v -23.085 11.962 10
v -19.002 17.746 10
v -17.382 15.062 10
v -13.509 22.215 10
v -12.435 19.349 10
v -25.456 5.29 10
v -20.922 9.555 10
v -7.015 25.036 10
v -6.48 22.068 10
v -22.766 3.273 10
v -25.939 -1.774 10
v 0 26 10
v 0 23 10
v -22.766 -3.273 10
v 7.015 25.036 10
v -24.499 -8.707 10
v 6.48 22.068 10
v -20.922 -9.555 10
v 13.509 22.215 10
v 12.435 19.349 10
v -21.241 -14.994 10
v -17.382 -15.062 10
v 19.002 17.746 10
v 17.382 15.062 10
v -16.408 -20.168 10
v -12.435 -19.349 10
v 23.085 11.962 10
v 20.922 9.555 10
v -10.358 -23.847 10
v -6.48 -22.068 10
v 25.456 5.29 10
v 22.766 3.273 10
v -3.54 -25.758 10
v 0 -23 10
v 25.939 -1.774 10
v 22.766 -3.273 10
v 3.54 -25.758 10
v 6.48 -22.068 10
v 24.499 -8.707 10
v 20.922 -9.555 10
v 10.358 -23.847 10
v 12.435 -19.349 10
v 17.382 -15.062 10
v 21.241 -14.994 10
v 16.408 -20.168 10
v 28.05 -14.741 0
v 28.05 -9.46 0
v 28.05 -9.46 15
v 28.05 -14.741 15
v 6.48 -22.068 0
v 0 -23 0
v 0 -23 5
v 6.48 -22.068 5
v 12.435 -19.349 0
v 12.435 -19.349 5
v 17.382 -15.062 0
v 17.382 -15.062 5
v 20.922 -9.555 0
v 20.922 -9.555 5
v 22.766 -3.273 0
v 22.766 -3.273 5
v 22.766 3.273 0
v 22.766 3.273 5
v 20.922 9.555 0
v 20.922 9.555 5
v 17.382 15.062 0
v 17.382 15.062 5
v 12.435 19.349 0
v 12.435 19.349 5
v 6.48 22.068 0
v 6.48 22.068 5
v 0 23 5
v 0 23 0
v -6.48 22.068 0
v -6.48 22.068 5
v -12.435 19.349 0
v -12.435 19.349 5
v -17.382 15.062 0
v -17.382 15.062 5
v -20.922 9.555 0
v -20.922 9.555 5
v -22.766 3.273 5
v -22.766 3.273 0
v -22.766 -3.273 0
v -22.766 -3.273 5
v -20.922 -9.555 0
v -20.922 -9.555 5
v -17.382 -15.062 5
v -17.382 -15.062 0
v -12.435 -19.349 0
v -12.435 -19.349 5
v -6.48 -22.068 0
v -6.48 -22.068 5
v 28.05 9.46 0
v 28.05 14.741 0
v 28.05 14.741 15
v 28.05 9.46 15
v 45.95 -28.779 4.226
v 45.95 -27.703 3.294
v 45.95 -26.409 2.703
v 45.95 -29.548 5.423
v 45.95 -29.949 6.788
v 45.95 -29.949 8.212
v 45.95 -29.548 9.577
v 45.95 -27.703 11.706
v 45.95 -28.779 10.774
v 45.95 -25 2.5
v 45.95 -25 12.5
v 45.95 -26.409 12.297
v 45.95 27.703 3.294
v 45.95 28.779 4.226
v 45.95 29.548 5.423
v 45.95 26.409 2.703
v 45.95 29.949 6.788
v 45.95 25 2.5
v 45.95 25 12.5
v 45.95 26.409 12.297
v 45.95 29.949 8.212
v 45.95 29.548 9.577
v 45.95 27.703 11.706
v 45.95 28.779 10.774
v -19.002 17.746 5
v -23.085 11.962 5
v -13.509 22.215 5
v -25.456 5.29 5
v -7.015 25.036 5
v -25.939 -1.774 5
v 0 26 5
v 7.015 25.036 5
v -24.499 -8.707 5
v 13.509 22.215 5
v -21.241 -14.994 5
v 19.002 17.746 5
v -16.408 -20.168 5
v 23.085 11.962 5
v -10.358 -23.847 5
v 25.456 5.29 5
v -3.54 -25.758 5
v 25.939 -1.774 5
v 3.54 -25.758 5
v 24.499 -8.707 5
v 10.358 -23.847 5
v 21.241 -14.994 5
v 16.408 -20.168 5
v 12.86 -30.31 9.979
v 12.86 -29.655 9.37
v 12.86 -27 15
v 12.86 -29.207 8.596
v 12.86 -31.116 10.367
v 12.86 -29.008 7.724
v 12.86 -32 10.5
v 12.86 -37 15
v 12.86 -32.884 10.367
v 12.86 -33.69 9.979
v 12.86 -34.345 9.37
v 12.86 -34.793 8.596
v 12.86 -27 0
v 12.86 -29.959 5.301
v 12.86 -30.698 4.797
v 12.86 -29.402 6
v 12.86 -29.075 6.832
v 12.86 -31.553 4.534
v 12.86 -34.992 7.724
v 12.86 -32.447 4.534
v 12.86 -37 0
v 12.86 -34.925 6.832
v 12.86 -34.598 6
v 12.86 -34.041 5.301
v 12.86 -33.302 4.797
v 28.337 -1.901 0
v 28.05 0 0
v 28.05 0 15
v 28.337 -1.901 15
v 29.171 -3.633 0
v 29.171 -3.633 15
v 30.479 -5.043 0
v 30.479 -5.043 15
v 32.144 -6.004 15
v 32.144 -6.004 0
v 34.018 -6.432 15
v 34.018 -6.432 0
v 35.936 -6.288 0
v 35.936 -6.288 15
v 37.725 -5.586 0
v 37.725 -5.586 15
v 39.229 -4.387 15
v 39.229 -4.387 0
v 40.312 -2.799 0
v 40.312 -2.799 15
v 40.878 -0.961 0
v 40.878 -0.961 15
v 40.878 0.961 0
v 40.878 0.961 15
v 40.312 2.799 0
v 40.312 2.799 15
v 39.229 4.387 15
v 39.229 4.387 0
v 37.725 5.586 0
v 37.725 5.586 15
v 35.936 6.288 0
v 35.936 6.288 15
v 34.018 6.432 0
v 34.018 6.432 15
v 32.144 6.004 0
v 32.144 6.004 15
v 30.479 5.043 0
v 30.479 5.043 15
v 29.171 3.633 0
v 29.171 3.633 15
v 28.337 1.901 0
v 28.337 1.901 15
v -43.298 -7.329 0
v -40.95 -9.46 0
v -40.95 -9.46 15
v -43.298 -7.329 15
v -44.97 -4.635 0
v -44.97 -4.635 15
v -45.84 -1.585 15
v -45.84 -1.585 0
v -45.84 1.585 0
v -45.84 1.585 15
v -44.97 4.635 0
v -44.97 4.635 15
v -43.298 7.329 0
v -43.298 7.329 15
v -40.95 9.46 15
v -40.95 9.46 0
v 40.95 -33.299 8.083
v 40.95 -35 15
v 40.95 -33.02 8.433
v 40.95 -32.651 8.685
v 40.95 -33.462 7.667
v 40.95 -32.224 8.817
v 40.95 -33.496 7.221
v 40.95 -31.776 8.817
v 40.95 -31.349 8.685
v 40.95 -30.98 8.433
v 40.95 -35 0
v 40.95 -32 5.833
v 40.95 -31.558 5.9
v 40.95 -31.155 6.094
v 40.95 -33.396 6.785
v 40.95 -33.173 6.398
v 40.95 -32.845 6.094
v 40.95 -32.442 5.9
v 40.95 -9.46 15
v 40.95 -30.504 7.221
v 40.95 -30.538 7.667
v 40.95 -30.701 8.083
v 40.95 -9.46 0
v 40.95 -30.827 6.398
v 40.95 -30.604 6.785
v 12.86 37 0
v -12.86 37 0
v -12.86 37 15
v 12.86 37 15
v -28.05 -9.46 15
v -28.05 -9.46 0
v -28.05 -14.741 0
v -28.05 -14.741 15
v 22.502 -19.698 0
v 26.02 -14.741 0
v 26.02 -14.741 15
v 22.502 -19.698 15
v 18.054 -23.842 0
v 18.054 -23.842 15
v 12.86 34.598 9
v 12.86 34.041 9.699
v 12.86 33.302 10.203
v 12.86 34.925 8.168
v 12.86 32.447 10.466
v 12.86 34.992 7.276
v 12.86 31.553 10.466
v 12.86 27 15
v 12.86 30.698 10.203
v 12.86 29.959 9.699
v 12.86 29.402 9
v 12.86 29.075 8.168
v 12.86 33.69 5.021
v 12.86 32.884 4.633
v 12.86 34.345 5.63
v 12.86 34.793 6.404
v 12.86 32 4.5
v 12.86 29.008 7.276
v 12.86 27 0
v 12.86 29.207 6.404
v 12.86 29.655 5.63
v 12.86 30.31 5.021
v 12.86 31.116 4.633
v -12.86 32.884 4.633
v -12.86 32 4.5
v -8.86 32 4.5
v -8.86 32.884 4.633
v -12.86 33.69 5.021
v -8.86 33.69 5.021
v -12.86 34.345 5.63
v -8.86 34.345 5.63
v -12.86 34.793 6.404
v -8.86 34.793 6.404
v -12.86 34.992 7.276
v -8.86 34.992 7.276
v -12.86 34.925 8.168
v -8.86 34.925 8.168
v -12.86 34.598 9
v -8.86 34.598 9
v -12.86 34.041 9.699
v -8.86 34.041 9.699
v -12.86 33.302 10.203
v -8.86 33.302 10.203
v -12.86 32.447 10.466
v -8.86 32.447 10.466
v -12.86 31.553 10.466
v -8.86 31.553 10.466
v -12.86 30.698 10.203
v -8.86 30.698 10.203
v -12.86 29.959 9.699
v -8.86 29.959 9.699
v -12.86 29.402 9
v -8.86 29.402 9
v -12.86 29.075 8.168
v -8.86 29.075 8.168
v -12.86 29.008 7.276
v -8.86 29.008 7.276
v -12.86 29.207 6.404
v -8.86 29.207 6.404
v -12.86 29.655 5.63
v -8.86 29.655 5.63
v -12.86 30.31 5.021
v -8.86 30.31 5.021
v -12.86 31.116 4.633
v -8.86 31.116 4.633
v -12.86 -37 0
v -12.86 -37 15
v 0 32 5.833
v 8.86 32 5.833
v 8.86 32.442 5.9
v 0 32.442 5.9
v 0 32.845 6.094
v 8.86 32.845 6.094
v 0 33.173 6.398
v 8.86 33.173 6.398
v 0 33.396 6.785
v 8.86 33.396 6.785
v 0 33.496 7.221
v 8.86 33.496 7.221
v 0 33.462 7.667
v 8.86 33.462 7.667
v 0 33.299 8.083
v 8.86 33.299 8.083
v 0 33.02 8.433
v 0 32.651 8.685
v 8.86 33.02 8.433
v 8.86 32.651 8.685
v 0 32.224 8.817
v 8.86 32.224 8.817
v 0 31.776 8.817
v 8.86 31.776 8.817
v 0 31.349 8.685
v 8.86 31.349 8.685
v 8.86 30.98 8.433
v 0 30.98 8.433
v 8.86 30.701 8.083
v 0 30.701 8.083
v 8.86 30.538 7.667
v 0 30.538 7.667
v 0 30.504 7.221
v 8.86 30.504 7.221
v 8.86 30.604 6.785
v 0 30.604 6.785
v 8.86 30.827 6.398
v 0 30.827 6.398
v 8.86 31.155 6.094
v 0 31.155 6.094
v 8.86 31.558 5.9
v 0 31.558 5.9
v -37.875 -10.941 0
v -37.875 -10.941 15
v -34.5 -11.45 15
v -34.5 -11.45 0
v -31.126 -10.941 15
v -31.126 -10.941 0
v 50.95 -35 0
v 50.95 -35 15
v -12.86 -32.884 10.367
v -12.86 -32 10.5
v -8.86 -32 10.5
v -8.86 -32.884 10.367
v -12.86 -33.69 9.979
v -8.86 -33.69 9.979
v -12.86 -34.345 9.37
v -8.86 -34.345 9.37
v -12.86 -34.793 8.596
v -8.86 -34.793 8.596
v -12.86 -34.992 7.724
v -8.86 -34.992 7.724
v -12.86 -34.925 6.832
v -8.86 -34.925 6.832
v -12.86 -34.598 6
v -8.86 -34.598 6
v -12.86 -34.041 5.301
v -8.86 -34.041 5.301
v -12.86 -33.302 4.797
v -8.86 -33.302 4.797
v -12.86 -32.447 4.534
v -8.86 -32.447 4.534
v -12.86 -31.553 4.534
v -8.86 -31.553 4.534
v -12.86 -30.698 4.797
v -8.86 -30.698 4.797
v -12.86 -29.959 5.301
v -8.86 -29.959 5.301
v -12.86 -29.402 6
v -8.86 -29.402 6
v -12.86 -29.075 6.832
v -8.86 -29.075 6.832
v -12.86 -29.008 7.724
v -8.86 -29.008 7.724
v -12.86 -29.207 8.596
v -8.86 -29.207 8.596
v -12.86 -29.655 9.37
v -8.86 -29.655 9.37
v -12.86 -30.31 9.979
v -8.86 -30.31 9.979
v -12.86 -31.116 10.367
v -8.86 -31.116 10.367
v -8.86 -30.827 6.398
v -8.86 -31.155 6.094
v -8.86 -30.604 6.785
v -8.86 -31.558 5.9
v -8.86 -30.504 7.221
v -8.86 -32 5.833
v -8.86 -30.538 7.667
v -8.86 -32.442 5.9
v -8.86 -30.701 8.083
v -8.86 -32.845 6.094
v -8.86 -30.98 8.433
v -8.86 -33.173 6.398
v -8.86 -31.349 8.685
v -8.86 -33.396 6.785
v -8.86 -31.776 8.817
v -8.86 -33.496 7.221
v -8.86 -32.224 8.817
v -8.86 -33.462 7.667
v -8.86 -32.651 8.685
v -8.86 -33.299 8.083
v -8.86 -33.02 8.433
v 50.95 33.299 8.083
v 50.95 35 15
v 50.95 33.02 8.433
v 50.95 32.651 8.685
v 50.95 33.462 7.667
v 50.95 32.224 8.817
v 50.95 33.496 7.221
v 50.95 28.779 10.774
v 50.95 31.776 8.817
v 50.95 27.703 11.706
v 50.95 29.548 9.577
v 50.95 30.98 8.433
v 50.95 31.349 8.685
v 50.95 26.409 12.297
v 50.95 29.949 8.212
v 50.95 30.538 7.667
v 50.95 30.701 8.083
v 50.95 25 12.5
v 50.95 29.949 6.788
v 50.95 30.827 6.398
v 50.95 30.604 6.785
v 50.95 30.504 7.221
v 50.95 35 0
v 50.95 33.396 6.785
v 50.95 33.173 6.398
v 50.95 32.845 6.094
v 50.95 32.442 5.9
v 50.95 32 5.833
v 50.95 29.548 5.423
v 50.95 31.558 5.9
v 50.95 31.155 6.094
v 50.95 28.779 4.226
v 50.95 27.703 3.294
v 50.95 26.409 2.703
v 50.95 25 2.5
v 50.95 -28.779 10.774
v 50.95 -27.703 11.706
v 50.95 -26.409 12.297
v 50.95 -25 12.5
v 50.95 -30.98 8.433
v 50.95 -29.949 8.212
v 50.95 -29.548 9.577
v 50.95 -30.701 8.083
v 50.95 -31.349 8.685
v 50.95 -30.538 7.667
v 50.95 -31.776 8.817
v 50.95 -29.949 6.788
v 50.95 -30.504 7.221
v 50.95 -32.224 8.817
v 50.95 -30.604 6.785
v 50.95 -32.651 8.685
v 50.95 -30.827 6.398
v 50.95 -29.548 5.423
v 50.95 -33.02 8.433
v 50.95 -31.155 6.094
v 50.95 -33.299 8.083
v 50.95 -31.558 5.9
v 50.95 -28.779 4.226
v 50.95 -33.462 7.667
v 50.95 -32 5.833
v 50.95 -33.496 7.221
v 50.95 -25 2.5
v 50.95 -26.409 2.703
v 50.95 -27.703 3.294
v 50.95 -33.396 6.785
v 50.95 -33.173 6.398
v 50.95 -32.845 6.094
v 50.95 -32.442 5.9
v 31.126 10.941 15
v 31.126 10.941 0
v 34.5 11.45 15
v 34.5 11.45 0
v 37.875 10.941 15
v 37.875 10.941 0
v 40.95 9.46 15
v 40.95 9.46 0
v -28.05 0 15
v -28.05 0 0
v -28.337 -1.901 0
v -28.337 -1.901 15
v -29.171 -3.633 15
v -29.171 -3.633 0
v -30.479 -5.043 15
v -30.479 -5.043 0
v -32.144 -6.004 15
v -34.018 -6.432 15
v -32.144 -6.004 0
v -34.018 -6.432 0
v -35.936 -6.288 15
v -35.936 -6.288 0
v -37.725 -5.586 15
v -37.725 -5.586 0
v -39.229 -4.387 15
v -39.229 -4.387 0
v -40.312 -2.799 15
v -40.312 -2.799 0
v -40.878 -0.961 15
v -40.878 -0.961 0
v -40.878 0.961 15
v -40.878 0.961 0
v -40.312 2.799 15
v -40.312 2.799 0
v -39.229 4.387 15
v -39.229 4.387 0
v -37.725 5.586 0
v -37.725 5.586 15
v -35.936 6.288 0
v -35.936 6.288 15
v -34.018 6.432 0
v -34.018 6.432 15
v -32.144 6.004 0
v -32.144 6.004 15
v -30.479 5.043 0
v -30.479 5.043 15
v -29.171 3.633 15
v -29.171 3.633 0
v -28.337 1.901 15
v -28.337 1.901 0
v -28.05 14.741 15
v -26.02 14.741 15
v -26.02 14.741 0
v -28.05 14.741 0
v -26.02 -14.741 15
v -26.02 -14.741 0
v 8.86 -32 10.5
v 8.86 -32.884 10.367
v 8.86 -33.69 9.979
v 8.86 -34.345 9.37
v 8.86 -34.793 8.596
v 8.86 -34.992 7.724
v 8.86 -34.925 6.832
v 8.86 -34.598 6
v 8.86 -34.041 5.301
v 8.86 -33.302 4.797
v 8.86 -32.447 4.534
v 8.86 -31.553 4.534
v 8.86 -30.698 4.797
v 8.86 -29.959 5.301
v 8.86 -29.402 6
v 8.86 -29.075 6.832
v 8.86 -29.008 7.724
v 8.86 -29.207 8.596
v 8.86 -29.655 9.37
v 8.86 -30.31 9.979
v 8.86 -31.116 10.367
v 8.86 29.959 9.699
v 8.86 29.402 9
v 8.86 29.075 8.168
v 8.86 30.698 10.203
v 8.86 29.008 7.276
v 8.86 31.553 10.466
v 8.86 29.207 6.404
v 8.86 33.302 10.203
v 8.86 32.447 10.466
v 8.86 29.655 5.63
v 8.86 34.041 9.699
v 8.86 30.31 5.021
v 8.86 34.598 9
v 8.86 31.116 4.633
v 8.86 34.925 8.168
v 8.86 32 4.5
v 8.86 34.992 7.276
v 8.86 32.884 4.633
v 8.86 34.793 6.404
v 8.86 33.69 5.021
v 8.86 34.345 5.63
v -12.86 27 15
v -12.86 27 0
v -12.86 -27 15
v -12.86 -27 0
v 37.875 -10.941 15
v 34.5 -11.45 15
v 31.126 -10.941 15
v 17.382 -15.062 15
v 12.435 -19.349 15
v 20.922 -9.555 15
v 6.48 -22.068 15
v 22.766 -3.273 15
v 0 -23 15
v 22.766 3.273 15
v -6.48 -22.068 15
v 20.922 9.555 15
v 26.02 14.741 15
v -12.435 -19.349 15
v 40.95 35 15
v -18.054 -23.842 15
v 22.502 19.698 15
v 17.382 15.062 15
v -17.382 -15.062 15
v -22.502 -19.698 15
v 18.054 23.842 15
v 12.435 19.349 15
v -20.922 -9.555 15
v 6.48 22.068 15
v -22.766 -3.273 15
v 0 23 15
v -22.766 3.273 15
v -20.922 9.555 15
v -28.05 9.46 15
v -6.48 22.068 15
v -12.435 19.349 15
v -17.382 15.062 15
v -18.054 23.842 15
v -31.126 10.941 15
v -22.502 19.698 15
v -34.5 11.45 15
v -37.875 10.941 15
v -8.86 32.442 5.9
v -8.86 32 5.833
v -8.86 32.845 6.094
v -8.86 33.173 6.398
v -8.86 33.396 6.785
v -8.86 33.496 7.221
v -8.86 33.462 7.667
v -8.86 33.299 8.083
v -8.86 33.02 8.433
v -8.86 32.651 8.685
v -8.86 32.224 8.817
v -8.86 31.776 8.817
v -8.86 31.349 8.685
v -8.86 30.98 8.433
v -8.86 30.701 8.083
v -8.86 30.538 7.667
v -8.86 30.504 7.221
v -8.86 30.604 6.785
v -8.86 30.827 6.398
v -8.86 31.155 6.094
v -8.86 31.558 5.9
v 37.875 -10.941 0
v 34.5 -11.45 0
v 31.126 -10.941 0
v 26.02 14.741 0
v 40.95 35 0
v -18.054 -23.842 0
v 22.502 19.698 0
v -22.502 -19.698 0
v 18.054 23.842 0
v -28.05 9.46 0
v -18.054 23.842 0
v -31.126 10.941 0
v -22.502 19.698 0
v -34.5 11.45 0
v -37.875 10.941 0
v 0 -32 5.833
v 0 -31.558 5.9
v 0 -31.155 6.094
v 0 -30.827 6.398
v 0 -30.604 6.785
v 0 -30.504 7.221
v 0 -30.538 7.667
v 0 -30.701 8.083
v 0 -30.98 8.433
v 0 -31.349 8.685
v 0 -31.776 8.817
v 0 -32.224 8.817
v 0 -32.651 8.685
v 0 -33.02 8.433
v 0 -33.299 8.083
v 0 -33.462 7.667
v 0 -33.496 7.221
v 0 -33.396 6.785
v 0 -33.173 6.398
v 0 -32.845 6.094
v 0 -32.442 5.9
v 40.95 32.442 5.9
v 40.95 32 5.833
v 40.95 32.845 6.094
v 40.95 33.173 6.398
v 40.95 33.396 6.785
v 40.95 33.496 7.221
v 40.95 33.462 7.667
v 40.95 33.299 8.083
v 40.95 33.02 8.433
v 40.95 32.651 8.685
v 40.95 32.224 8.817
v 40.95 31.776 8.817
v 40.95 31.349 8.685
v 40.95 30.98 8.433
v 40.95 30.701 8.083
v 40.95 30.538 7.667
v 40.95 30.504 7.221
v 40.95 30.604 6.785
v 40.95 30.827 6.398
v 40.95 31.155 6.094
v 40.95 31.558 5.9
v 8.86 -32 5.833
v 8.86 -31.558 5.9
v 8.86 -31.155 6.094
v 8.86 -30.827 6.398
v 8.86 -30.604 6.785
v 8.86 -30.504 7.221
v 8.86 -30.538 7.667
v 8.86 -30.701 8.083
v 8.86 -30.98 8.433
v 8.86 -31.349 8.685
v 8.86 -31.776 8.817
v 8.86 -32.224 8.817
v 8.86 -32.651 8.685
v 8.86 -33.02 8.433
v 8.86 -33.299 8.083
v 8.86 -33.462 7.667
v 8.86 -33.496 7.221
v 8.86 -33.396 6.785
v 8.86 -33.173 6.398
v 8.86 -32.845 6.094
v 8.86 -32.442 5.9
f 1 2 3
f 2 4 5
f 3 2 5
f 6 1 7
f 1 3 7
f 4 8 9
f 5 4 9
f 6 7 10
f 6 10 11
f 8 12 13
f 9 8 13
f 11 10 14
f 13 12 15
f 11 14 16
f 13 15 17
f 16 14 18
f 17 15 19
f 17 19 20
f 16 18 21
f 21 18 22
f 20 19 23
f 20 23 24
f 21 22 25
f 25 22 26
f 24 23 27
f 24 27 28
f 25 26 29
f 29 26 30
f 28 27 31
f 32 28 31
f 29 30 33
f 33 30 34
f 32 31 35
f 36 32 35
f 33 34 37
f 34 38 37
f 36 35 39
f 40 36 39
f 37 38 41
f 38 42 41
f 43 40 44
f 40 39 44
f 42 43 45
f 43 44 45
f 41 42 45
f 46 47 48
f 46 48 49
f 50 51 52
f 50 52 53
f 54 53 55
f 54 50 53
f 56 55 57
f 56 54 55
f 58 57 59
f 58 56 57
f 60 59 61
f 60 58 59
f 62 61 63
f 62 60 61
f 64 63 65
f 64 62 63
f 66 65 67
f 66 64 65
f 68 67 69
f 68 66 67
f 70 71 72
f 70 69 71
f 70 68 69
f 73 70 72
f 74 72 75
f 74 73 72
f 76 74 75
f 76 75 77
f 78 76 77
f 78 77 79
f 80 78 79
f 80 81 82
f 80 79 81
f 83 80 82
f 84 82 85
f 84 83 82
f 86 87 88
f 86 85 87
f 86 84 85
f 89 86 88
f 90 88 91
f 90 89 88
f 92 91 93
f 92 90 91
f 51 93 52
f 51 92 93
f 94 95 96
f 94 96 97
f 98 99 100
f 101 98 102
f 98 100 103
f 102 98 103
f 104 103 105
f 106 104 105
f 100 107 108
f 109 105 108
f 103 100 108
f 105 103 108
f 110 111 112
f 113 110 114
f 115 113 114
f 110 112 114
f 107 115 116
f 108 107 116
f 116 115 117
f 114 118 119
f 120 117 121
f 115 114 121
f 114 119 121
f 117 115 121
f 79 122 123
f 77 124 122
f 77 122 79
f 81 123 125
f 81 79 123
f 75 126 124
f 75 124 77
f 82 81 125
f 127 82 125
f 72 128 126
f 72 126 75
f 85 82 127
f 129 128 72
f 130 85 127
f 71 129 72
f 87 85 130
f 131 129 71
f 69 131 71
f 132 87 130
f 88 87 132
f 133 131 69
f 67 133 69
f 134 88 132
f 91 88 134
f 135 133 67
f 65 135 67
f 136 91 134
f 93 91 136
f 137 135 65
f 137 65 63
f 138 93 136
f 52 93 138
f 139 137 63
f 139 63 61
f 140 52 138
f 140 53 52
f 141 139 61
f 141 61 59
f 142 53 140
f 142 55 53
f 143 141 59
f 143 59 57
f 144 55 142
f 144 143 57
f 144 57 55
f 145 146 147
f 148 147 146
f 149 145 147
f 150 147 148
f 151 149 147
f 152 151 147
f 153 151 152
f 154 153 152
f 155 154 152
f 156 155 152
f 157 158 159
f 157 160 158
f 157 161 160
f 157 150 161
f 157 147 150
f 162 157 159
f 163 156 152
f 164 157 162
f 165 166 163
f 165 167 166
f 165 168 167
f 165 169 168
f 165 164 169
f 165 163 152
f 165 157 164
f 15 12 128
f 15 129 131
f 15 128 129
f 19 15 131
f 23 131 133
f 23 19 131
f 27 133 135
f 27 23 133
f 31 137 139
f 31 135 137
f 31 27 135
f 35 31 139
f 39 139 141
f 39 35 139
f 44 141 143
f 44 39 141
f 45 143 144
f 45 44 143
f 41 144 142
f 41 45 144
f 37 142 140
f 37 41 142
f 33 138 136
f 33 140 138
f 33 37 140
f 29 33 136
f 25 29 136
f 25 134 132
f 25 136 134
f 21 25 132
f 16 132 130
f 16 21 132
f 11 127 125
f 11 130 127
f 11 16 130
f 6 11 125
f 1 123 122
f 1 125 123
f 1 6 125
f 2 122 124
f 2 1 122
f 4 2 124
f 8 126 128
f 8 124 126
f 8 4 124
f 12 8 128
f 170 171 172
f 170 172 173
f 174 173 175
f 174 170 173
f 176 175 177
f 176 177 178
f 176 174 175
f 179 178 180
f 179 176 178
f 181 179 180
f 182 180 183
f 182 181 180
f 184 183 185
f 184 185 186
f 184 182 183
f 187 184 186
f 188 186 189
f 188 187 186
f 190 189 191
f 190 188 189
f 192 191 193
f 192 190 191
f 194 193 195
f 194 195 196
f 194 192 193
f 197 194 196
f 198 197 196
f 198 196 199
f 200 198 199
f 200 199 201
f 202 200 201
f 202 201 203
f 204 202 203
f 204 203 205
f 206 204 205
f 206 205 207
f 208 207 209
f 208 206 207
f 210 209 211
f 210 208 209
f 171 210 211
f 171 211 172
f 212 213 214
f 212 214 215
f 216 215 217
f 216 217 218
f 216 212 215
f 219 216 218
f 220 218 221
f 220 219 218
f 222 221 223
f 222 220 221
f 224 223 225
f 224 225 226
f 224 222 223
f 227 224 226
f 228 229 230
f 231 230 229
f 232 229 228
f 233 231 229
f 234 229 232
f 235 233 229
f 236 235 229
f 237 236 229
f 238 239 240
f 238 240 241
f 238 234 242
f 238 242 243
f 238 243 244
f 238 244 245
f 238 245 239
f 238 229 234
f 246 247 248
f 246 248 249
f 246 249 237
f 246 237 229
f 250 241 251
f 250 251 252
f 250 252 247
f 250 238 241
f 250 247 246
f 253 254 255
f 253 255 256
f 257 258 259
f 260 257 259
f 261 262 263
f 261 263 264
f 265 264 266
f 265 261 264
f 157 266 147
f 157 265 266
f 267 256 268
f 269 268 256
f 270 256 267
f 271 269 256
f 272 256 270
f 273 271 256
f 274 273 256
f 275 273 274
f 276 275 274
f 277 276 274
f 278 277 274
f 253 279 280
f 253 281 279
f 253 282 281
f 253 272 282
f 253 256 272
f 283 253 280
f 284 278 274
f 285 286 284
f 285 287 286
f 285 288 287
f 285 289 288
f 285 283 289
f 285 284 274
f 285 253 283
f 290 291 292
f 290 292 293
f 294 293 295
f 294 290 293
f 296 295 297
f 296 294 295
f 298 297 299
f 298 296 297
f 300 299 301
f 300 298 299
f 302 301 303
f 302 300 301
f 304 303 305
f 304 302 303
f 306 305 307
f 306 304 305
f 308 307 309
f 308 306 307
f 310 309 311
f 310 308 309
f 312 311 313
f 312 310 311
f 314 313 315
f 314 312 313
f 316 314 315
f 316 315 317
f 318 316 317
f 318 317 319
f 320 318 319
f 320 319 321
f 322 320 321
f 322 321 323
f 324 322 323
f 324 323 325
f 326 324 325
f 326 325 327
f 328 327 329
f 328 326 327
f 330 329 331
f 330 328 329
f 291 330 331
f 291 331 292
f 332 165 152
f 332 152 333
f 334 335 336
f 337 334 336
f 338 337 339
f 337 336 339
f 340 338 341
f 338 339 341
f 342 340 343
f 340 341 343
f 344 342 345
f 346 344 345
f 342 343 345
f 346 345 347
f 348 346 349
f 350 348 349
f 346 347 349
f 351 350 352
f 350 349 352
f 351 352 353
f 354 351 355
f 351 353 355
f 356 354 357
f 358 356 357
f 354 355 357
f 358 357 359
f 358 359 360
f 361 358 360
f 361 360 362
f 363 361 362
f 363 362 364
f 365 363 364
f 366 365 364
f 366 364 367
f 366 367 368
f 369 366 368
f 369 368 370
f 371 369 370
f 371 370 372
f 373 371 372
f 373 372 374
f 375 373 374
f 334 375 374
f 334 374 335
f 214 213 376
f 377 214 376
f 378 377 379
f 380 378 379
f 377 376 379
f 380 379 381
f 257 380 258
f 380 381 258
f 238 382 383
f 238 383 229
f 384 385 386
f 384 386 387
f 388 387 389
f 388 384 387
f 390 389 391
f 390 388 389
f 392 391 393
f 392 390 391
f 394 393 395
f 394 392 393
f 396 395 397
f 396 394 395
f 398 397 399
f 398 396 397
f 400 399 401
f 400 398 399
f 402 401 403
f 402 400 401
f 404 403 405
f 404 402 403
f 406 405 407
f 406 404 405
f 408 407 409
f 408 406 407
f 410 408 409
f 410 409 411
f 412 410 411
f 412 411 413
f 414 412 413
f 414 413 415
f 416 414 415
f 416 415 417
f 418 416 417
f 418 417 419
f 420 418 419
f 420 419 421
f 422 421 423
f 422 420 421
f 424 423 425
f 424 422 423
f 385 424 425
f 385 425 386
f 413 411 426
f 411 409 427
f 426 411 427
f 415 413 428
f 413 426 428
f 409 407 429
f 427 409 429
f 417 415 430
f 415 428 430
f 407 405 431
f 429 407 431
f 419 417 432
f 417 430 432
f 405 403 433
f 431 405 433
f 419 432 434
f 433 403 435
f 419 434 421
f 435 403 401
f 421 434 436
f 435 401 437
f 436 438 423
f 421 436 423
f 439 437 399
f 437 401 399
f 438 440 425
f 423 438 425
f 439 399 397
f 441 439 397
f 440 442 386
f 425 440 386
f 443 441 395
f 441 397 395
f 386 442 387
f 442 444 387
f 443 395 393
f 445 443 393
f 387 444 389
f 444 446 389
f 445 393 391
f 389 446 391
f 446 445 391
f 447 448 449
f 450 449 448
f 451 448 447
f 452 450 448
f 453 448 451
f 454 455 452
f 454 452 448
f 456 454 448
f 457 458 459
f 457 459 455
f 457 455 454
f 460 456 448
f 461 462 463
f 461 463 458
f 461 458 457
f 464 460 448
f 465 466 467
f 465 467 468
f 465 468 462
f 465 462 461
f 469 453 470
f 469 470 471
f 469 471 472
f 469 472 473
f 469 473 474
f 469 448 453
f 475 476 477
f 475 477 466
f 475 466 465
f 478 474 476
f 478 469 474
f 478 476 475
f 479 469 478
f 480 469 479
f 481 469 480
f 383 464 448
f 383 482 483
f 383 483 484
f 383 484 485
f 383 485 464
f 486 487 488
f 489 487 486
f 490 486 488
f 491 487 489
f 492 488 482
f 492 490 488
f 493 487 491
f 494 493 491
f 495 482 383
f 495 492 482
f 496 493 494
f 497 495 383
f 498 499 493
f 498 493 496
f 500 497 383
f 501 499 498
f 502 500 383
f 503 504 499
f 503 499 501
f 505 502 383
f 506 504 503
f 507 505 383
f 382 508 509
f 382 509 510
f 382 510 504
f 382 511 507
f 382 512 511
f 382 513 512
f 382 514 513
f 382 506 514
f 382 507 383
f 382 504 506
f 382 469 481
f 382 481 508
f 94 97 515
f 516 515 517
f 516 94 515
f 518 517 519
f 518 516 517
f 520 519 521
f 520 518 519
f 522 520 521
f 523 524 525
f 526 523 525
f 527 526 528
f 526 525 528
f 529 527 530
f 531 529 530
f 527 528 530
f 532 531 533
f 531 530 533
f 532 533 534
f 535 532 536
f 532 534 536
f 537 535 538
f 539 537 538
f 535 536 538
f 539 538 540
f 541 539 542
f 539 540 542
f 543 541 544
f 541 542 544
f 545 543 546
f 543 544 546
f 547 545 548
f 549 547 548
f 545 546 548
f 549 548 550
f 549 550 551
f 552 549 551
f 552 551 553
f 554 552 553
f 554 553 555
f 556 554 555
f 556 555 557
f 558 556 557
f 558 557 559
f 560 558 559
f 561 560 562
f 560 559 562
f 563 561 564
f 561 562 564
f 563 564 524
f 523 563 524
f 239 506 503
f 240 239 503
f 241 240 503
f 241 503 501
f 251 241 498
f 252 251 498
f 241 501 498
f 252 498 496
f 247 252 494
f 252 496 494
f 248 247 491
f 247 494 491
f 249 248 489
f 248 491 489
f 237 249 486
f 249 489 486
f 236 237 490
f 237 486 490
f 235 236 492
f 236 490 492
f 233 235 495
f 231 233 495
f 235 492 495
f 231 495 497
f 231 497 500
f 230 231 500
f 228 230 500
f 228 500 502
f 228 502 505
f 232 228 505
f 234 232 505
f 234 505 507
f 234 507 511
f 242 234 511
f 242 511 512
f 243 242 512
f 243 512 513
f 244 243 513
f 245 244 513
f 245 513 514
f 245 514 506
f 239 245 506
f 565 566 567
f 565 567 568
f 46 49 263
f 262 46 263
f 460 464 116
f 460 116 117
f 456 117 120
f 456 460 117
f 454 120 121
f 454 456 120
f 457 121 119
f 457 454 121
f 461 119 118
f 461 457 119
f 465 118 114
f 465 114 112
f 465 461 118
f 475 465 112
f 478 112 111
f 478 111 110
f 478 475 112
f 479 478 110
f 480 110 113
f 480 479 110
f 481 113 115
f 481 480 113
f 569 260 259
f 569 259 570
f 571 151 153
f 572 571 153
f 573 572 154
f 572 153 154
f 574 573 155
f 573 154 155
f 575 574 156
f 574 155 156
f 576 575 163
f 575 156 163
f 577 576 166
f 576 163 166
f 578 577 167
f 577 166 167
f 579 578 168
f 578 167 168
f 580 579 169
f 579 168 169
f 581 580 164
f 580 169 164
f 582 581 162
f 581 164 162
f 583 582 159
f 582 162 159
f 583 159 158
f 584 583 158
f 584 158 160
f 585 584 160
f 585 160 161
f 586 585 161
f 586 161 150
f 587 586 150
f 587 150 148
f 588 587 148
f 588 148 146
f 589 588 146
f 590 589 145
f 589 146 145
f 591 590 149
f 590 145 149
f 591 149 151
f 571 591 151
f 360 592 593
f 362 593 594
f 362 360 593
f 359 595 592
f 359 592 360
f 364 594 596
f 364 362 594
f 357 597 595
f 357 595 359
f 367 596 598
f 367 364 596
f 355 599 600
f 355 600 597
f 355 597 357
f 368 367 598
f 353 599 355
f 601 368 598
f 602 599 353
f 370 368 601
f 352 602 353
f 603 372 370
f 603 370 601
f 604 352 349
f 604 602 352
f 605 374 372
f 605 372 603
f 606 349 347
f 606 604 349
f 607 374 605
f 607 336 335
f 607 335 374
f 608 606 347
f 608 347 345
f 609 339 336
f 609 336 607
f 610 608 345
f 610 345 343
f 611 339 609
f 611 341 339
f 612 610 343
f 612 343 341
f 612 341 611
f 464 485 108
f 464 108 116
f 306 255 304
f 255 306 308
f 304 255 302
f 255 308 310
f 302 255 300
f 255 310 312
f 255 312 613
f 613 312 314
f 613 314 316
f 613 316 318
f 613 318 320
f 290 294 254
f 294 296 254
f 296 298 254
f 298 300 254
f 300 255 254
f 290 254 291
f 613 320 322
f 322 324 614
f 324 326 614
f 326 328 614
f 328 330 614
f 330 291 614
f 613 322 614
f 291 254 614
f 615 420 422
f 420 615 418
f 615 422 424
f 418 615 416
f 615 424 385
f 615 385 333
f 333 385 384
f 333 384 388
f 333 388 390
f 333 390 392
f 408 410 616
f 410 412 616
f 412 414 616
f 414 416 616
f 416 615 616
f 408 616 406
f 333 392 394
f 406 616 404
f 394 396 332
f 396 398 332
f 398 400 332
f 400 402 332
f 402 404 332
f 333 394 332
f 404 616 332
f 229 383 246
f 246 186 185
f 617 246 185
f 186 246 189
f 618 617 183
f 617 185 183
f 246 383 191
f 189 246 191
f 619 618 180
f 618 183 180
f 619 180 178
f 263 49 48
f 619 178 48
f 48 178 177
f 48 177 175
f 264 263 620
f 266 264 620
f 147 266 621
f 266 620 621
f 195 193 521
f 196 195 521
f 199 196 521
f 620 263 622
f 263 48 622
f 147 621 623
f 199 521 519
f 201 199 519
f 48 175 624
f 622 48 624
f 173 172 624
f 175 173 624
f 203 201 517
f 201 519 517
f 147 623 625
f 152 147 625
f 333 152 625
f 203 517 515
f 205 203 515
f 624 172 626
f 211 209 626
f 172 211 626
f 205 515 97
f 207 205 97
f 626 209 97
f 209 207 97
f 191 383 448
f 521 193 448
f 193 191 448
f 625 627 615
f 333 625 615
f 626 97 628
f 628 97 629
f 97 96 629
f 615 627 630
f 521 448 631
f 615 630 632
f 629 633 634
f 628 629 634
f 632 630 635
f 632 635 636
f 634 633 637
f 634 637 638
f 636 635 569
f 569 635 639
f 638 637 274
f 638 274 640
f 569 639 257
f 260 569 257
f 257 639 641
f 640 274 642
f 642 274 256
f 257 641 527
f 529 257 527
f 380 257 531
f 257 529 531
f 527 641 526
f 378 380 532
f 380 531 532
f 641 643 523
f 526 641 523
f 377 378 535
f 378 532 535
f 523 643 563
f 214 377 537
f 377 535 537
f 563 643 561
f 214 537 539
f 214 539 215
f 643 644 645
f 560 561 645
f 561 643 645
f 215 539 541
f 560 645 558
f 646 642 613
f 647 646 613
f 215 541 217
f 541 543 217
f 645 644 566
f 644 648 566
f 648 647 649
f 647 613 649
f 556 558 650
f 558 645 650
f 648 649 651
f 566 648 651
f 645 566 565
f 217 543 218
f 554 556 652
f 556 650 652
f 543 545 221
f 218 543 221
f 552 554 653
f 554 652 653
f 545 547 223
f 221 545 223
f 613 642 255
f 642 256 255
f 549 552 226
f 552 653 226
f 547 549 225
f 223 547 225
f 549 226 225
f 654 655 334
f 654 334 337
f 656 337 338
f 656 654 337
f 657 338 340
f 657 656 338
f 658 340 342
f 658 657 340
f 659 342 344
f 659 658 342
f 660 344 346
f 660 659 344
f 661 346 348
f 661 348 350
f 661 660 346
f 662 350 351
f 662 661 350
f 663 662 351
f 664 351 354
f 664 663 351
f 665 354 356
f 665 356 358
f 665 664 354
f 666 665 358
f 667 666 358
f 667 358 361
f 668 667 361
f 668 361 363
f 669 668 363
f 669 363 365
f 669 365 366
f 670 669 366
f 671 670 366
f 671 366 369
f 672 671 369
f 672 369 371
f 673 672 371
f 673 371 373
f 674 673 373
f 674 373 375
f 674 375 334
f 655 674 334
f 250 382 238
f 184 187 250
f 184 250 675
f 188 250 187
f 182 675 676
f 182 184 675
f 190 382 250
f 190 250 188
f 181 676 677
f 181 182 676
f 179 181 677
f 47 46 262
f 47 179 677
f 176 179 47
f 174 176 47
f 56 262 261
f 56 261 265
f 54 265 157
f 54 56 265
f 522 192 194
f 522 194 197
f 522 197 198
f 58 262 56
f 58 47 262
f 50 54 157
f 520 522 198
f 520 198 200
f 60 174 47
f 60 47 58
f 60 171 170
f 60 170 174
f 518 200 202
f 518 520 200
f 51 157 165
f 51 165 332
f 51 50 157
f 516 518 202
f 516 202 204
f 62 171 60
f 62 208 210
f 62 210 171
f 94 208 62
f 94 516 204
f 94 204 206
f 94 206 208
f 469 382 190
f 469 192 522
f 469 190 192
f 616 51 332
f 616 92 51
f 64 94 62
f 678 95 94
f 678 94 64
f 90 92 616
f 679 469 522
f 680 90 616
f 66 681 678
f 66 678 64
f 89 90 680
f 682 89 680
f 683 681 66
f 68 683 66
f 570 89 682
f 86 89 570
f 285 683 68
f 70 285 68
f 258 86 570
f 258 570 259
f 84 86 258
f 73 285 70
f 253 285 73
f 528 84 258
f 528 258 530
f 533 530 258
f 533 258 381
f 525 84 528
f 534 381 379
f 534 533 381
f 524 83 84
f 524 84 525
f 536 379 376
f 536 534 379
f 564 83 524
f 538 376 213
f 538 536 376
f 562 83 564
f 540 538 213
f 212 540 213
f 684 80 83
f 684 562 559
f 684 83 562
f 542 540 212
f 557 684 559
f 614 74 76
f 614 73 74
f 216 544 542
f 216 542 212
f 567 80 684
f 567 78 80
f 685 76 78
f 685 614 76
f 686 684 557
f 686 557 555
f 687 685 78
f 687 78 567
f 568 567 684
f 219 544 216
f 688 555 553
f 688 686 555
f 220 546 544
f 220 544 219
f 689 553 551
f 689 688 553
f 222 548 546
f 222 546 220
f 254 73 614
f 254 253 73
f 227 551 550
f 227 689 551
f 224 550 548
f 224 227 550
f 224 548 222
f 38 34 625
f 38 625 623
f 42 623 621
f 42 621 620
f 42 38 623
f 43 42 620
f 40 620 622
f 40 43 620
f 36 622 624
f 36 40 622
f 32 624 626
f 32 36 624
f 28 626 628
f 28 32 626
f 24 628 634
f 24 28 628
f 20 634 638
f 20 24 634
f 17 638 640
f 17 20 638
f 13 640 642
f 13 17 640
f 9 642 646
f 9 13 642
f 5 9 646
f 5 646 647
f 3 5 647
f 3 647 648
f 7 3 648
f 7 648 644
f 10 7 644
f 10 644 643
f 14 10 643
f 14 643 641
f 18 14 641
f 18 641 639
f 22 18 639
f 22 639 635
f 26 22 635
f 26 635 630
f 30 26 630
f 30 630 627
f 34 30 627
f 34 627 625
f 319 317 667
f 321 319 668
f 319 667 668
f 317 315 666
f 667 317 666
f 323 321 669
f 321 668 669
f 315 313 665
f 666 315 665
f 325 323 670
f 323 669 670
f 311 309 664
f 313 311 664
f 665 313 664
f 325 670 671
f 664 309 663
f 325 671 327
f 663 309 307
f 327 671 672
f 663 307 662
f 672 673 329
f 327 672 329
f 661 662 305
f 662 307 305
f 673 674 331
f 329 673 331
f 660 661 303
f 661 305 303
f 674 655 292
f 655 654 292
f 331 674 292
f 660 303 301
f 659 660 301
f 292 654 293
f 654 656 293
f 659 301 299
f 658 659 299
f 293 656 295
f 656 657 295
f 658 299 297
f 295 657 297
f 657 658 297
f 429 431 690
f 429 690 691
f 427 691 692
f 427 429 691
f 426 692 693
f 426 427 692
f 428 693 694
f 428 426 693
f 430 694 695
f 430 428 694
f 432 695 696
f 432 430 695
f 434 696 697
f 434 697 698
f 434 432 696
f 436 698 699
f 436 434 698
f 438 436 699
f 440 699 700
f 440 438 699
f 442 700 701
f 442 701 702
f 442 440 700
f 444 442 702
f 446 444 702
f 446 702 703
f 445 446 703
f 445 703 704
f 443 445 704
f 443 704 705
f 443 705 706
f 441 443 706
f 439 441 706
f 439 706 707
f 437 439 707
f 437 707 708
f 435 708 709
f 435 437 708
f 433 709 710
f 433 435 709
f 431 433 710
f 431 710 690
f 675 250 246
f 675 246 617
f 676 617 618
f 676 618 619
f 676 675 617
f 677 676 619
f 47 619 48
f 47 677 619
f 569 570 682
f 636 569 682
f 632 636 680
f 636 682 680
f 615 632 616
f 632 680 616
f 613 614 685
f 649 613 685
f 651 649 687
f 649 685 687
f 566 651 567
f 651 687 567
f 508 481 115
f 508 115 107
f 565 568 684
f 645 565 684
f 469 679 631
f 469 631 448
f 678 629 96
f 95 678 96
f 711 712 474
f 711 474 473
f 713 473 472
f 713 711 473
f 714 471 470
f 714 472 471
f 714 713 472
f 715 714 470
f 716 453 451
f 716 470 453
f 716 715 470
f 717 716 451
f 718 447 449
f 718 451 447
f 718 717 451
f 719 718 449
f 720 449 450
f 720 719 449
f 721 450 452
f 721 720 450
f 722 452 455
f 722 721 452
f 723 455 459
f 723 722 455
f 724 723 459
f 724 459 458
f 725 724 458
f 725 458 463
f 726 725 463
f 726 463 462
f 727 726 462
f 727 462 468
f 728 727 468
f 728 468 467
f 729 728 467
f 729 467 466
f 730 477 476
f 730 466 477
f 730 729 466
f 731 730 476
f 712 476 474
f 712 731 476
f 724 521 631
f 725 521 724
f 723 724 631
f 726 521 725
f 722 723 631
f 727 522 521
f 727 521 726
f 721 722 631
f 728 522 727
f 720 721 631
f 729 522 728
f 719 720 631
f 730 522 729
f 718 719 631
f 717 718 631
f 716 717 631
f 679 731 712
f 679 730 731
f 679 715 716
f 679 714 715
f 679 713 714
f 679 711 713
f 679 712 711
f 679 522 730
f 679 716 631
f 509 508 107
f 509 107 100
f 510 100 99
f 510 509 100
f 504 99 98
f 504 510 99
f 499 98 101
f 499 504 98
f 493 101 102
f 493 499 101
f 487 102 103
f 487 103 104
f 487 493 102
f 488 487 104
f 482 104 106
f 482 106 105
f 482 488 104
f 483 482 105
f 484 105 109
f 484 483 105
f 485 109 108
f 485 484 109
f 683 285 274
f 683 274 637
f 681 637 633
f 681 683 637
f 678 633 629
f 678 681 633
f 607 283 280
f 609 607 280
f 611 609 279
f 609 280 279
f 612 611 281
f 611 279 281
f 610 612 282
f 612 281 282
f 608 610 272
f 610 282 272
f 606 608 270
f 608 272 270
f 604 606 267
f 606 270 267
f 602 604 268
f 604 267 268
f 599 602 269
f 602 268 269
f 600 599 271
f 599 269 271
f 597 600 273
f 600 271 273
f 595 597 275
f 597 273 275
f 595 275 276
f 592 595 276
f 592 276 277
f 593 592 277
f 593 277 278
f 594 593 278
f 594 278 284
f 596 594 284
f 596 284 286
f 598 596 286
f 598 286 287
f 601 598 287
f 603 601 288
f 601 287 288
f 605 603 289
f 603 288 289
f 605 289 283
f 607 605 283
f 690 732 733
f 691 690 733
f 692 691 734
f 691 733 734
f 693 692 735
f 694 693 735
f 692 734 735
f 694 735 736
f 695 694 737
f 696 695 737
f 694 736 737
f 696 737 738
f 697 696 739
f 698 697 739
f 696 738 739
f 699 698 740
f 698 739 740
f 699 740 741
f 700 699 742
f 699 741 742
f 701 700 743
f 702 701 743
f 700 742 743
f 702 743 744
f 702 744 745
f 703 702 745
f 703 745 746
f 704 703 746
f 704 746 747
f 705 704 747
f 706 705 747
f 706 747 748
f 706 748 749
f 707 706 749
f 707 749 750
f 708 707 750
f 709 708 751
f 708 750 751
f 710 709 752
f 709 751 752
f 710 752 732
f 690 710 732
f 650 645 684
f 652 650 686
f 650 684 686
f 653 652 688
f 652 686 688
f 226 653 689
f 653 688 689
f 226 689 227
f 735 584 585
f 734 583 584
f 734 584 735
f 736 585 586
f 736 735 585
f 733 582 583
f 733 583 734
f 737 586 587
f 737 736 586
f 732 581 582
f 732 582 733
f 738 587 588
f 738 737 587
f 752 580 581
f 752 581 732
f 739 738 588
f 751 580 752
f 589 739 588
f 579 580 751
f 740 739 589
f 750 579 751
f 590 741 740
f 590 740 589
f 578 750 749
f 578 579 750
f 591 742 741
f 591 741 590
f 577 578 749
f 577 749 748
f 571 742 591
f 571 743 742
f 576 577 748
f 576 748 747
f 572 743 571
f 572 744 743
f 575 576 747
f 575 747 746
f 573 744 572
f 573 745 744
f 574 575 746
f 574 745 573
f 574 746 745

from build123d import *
from build123d.topology import SkipClean

# Parameters (mm, degrees)
SKETCH1_R           = 6.45
BOSS_EXTRUDE1_DEPTH = 15
SKETCH2_W           = 5
SKETCH2_H           = 3
CUT_EXTRUDE3_DEPTH  = 5
SKETCH4_R           = 1.5
CUT_EXTRUDE4_DEPTH  = 56.180796325
SKETCH5_R           = 3
CUT_EXTRUDE5_DEPTH  = 4
CUT_EXTRUDE6_START  = -80
CUT_EXTRUDE6_DEPTH  = 80


with BuildPart() as part:
    # Sketch1 → Boss-Extrude1 (new body)
    with BuildSketch(Plane.XY):
        with BuildLine():
            Line((0, 23), (0, 37))
            Line((0, 37), (12.859510911, 37))
            Line((12.859510911, 37), (12.859510911, 27))
            ThreePointArc((12.859510911, 27), (20.383390121, 21.88342816), (26.020458433, 14.741192754))
            Line((26.020458433, 14.741192754), (28.050458433, 14.741192754))
            Line((28.050458433, 14.741192754), (28.050458433, 9.460443964))
            ThreePointArc((28.050458433, 9.460443964), (34.500458433, 11.45), (40.950458433, 9.460443964))
            Line((40.950458433, 9.460443964), (40.950458433, 35))
            Line((40.950458433, 35), (50.950458433, 35))
            Line((50.950458433, 35), (50.950458433, -35))
            Line((50.950458433, -35), (40.950458433, -35))
            Line((40.950458433, -35), (40.950458433, -9.460443964))
            ThreePointArc((40.950458433, -9.460443964), (34.500458433, -11.45), (28.050458433, -9.460443964))
            Line((28.050458433, -9.460443964), (28.050458433, -14.741192754))
            Line((28.050458433, -14.741192754), (26.020458433, -14.741192754))
            ThreePointArc((26.020458433, -14.741192754), (20.383390121, -21.88342816), (12.859510911, -27))
            Line((12.859510911, -27), (12.859510911, -37))
            Line((12.859510911, -37), (0, -37))
            Line((0, -37), (0, -23))
            ThreePointArc((0, -23), (23, 0), (0, 23))
        make_face()
        with Locations(Location((34.500458433, 0, 0), (0, 0, 180))):
            Circle(SKETCH1_R, mode=Mode.SUBTRACT)
    boss_extrude1 = extrude(amount=BOSS_EXTRUDE1_DEPTH)

    # Sketch2 → Cut-Revolve1 (revolve, cut)
    with BuildSketch(Plane.ZY):
        with Locations((7.5, 24.5)):
            Rectangle(SKETCH2_W, SKETCH2_H)
    cut_revolve1 = revolve(axis=Axis((0, 0, 15), (0, 0, -1)), mode=Mode.SUBTRACT)

    # Sketch3 → Cut-Extrude3 (cut)
    with BuildSketch(Plane(origin=(50.950458433, 0, 0), x_dir=(0, 0, -1), z_dir=(1, 0, 0))):
        with BuildLine():
            Line((-12.5, -25), (-12.5, 25))
            ThreePointArc((-12.5, 25), (-7.5, 30), (-2.5, 25))
            Line((-2.5, 25), (-2.5, -25))
            ThreePointArc((-2.5, -25), (-7.5, -30), (-12.5, -25))
        make_face()
    extrude(amount=-CUT_EXTRUDE3_DEPTH, mode=Mode.SUBTRACT)

    # Sketch4 → Cut-Extrude4 (cut, symmetric)
    with BuildSketch(Plane(origin=(12.859510911, 0, 0), x_dir=(0, 0, -1), z_dir=(1, 0, 0))):
        with Locations((-7.333431897, 32)):
            Circle(SKETCH4_R)
        with Locations((-7.333431897, -32)):
            Circle(SKETCH4_R)
    cut_extrude4 = extrude(amount=CUT_EXTRUDE4_DEPTH, both=True, mode=Mode.SUBTRACT)

    # Sketch5 → Cut-Extrude5 (cut)
    with BuildSketch(Plane(origin=(12.859510911, 0, 0), x_dir=(0, 0, -1), z_dir=(1, 0, 0))):
        with Locations((-7.5, 32)):
            Circle(SKETCH5_R)
        with Locations(Location((-7.5, -32, 0), (0, 0, 180))):
            Circle(SKETCH5_R)
    cut_extrude5 = extrude(amount=-CUT_EXTRUDE5_DEPTH, mode=Mode.SUBTRACT)

    # Mirror1: Boss-Extrude1, Cut-Revolve1, Cut-Extrude4, Cut-Extrude5 across plane
    add(boss_extrude1.mirror(Plane.ZY))
    add(cut_revolve1.mirror(Plane.ZY), mode=Mode.SUBTRACT)
    add(cut_extrude4.mirror(Plane.ZY), mode=Mode.SUBTRACT)
    add(cut_extrude5.mirror(Plane.ZY), mode=Mode.SUBTRACT)

    # Sketch6 → Cut-Extrude6 (cut)
    with SkipClean():  # the faces are left unmerged after this step: merging them gives an invalid solid
        with BuildSketch(Plane.XY.offset(15).offset(CUT_EXTRUDE6_START)):
            with BuildLine():
                Line((-40.950458433, 9.460443964), (-40.950458433, 38.741811421))
                Line((-40.950458433, 38.741811421), (-62.772471418, 38.741811421))
                Line((-62.772471418, 38.741811421), (-62.772471418, -39.471412389))
                Line((-62.772471418, -39.471412389), (-40.950458433, -39.471412389))
                Line((-40.950458433, -39.471412389), (-40.950458433, -9.460443964))
                ThreePointArc((-40.950458433, -9.460443964), (-45.950458433, 0), (-40.950458433, 9.460443964))
            make_face()
        extrude(amount=CUT_EXTRUDE6_DEPTH, mode=Mode.SUBTRACT)


solid = part.part
